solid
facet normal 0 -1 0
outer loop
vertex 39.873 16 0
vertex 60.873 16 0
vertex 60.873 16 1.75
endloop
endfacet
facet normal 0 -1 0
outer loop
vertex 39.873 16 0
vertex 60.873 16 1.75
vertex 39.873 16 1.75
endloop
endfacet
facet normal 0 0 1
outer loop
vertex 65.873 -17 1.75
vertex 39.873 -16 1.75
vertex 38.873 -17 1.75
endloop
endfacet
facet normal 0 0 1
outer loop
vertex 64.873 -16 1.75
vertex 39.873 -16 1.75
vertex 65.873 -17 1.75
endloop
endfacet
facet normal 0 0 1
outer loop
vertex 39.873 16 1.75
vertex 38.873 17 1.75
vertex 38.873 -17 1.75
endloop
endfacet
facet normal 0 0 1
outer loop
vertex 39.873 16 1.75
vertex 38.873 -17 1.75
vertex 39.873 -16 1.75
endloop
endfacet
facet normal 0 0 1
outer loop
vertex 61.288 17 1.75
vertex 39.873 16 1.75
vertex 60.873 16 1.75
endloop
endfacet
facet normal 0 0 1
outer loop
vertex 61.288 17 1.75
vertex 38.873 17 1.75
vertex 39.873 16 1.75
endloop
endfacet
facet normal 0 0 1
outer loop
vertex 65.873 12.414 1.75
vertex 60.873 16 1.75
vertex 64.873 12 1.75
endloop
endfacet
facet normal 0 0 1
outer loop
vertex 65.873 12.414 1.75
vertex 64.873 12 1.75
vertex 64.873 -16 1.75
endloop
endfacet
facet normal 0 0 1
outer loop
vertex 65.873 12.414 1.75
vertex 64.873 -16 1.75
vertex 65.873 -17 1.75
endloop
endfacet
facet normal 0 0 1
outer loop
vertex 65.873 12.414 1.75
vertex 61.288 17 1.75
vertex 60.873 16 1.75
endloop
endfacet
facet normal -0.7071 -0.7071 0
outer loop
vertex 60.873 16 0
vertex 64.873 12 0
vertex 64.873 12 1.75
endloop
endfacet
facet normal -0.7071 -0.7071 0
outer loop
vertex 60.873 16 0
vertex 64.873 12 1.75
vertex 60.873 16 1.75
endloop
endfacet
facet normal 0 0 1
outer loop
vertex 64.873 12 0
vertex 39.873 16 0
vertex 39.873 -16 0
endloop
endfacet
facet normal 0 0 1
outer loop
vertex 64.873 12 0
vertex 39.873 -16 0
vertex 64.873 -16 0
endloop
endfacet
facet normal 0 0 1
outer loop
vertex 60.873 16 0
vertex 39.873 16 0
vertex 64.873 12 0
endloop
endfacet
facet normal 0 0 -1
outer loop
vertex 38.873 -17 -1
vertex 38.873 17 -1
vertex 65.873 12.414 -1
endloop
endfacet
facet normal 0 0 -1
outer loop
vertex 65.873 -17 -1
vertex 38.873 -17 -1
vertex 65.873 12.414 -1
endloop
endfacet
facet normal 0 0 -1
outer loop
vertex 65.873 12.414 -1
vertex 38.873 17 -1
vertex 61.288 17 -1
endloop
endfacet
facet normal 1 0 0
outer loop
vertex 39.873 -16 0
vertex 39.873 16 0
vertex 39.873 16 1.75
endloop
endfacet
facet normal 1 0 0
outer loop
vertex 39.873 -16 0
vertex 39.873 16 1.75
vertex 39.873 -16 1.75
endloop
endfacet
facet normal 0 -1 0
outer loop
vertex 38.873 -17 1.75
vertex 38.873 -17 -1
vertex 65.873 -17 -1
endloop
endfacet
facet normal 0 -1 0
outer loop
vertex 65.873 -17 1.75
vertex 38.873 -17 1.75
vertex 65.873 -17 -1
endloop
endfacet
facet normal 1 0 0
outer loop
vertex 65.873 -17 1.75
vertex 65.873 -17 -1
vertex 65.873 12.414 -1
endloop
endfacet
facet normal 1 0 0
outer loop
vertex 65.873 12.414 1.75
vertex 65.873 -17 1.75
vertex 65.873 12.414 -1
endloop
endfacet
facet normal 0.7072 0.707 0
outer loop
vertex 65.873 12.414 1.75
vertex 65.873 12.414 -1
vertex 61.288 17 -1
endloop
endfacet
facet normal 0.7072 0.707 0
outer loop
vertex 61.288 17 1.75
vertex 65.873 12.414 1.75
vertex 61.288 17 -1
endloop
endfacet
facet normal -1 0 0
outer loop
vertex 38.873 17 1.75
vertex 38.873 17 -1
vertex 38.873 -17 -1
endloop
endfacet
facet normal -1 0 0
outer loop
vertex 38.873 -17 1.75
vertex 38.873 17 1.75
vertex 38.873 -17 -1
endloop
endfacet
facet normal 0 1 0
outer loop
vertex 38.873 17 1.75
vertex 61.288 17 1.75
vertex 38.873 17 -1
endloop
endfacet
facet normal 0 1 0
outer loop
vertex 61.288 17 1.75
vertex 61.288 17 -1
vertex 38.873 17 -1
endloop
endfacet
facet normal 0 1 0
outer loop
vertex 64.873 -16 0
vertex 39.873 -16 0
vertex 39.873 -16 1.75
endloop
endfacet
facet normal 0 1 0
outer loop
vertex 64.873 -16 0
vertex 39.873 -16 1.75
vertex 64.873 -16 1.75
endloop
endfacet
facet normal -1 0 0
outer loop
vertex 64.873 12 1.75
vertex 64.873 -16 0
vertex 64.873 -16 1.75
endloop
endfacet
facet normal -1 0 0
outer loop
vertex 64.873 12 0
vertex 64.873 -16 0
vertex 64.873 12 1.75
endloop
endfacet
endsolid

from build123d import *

# Parameters (mm, degrees)
F1_DEPTH = 1.75
F2_T     = 1


with BuildPart() as f1:
    # F0 (on Top) → F1 (new body)
    with BuildSketch(Plane.XY):
        Polygon((39.8734986782, 16), (39.8734986782, -16), (64.8734986782, -16), (64.8734986782, 12), (60.8734986782, 16), align=None)
    extrude(amount=F1_DEPTH)

    # F2
    f2_openings = [f1.faces().sort_by_distance(p)[0] for p in [
        (52.260704, -0.148148, 1.75),
    ]]
    offset(amount=F2_T, openings=f2_openings, kind=Kind.INTERSECTION)


solid = f1.part
